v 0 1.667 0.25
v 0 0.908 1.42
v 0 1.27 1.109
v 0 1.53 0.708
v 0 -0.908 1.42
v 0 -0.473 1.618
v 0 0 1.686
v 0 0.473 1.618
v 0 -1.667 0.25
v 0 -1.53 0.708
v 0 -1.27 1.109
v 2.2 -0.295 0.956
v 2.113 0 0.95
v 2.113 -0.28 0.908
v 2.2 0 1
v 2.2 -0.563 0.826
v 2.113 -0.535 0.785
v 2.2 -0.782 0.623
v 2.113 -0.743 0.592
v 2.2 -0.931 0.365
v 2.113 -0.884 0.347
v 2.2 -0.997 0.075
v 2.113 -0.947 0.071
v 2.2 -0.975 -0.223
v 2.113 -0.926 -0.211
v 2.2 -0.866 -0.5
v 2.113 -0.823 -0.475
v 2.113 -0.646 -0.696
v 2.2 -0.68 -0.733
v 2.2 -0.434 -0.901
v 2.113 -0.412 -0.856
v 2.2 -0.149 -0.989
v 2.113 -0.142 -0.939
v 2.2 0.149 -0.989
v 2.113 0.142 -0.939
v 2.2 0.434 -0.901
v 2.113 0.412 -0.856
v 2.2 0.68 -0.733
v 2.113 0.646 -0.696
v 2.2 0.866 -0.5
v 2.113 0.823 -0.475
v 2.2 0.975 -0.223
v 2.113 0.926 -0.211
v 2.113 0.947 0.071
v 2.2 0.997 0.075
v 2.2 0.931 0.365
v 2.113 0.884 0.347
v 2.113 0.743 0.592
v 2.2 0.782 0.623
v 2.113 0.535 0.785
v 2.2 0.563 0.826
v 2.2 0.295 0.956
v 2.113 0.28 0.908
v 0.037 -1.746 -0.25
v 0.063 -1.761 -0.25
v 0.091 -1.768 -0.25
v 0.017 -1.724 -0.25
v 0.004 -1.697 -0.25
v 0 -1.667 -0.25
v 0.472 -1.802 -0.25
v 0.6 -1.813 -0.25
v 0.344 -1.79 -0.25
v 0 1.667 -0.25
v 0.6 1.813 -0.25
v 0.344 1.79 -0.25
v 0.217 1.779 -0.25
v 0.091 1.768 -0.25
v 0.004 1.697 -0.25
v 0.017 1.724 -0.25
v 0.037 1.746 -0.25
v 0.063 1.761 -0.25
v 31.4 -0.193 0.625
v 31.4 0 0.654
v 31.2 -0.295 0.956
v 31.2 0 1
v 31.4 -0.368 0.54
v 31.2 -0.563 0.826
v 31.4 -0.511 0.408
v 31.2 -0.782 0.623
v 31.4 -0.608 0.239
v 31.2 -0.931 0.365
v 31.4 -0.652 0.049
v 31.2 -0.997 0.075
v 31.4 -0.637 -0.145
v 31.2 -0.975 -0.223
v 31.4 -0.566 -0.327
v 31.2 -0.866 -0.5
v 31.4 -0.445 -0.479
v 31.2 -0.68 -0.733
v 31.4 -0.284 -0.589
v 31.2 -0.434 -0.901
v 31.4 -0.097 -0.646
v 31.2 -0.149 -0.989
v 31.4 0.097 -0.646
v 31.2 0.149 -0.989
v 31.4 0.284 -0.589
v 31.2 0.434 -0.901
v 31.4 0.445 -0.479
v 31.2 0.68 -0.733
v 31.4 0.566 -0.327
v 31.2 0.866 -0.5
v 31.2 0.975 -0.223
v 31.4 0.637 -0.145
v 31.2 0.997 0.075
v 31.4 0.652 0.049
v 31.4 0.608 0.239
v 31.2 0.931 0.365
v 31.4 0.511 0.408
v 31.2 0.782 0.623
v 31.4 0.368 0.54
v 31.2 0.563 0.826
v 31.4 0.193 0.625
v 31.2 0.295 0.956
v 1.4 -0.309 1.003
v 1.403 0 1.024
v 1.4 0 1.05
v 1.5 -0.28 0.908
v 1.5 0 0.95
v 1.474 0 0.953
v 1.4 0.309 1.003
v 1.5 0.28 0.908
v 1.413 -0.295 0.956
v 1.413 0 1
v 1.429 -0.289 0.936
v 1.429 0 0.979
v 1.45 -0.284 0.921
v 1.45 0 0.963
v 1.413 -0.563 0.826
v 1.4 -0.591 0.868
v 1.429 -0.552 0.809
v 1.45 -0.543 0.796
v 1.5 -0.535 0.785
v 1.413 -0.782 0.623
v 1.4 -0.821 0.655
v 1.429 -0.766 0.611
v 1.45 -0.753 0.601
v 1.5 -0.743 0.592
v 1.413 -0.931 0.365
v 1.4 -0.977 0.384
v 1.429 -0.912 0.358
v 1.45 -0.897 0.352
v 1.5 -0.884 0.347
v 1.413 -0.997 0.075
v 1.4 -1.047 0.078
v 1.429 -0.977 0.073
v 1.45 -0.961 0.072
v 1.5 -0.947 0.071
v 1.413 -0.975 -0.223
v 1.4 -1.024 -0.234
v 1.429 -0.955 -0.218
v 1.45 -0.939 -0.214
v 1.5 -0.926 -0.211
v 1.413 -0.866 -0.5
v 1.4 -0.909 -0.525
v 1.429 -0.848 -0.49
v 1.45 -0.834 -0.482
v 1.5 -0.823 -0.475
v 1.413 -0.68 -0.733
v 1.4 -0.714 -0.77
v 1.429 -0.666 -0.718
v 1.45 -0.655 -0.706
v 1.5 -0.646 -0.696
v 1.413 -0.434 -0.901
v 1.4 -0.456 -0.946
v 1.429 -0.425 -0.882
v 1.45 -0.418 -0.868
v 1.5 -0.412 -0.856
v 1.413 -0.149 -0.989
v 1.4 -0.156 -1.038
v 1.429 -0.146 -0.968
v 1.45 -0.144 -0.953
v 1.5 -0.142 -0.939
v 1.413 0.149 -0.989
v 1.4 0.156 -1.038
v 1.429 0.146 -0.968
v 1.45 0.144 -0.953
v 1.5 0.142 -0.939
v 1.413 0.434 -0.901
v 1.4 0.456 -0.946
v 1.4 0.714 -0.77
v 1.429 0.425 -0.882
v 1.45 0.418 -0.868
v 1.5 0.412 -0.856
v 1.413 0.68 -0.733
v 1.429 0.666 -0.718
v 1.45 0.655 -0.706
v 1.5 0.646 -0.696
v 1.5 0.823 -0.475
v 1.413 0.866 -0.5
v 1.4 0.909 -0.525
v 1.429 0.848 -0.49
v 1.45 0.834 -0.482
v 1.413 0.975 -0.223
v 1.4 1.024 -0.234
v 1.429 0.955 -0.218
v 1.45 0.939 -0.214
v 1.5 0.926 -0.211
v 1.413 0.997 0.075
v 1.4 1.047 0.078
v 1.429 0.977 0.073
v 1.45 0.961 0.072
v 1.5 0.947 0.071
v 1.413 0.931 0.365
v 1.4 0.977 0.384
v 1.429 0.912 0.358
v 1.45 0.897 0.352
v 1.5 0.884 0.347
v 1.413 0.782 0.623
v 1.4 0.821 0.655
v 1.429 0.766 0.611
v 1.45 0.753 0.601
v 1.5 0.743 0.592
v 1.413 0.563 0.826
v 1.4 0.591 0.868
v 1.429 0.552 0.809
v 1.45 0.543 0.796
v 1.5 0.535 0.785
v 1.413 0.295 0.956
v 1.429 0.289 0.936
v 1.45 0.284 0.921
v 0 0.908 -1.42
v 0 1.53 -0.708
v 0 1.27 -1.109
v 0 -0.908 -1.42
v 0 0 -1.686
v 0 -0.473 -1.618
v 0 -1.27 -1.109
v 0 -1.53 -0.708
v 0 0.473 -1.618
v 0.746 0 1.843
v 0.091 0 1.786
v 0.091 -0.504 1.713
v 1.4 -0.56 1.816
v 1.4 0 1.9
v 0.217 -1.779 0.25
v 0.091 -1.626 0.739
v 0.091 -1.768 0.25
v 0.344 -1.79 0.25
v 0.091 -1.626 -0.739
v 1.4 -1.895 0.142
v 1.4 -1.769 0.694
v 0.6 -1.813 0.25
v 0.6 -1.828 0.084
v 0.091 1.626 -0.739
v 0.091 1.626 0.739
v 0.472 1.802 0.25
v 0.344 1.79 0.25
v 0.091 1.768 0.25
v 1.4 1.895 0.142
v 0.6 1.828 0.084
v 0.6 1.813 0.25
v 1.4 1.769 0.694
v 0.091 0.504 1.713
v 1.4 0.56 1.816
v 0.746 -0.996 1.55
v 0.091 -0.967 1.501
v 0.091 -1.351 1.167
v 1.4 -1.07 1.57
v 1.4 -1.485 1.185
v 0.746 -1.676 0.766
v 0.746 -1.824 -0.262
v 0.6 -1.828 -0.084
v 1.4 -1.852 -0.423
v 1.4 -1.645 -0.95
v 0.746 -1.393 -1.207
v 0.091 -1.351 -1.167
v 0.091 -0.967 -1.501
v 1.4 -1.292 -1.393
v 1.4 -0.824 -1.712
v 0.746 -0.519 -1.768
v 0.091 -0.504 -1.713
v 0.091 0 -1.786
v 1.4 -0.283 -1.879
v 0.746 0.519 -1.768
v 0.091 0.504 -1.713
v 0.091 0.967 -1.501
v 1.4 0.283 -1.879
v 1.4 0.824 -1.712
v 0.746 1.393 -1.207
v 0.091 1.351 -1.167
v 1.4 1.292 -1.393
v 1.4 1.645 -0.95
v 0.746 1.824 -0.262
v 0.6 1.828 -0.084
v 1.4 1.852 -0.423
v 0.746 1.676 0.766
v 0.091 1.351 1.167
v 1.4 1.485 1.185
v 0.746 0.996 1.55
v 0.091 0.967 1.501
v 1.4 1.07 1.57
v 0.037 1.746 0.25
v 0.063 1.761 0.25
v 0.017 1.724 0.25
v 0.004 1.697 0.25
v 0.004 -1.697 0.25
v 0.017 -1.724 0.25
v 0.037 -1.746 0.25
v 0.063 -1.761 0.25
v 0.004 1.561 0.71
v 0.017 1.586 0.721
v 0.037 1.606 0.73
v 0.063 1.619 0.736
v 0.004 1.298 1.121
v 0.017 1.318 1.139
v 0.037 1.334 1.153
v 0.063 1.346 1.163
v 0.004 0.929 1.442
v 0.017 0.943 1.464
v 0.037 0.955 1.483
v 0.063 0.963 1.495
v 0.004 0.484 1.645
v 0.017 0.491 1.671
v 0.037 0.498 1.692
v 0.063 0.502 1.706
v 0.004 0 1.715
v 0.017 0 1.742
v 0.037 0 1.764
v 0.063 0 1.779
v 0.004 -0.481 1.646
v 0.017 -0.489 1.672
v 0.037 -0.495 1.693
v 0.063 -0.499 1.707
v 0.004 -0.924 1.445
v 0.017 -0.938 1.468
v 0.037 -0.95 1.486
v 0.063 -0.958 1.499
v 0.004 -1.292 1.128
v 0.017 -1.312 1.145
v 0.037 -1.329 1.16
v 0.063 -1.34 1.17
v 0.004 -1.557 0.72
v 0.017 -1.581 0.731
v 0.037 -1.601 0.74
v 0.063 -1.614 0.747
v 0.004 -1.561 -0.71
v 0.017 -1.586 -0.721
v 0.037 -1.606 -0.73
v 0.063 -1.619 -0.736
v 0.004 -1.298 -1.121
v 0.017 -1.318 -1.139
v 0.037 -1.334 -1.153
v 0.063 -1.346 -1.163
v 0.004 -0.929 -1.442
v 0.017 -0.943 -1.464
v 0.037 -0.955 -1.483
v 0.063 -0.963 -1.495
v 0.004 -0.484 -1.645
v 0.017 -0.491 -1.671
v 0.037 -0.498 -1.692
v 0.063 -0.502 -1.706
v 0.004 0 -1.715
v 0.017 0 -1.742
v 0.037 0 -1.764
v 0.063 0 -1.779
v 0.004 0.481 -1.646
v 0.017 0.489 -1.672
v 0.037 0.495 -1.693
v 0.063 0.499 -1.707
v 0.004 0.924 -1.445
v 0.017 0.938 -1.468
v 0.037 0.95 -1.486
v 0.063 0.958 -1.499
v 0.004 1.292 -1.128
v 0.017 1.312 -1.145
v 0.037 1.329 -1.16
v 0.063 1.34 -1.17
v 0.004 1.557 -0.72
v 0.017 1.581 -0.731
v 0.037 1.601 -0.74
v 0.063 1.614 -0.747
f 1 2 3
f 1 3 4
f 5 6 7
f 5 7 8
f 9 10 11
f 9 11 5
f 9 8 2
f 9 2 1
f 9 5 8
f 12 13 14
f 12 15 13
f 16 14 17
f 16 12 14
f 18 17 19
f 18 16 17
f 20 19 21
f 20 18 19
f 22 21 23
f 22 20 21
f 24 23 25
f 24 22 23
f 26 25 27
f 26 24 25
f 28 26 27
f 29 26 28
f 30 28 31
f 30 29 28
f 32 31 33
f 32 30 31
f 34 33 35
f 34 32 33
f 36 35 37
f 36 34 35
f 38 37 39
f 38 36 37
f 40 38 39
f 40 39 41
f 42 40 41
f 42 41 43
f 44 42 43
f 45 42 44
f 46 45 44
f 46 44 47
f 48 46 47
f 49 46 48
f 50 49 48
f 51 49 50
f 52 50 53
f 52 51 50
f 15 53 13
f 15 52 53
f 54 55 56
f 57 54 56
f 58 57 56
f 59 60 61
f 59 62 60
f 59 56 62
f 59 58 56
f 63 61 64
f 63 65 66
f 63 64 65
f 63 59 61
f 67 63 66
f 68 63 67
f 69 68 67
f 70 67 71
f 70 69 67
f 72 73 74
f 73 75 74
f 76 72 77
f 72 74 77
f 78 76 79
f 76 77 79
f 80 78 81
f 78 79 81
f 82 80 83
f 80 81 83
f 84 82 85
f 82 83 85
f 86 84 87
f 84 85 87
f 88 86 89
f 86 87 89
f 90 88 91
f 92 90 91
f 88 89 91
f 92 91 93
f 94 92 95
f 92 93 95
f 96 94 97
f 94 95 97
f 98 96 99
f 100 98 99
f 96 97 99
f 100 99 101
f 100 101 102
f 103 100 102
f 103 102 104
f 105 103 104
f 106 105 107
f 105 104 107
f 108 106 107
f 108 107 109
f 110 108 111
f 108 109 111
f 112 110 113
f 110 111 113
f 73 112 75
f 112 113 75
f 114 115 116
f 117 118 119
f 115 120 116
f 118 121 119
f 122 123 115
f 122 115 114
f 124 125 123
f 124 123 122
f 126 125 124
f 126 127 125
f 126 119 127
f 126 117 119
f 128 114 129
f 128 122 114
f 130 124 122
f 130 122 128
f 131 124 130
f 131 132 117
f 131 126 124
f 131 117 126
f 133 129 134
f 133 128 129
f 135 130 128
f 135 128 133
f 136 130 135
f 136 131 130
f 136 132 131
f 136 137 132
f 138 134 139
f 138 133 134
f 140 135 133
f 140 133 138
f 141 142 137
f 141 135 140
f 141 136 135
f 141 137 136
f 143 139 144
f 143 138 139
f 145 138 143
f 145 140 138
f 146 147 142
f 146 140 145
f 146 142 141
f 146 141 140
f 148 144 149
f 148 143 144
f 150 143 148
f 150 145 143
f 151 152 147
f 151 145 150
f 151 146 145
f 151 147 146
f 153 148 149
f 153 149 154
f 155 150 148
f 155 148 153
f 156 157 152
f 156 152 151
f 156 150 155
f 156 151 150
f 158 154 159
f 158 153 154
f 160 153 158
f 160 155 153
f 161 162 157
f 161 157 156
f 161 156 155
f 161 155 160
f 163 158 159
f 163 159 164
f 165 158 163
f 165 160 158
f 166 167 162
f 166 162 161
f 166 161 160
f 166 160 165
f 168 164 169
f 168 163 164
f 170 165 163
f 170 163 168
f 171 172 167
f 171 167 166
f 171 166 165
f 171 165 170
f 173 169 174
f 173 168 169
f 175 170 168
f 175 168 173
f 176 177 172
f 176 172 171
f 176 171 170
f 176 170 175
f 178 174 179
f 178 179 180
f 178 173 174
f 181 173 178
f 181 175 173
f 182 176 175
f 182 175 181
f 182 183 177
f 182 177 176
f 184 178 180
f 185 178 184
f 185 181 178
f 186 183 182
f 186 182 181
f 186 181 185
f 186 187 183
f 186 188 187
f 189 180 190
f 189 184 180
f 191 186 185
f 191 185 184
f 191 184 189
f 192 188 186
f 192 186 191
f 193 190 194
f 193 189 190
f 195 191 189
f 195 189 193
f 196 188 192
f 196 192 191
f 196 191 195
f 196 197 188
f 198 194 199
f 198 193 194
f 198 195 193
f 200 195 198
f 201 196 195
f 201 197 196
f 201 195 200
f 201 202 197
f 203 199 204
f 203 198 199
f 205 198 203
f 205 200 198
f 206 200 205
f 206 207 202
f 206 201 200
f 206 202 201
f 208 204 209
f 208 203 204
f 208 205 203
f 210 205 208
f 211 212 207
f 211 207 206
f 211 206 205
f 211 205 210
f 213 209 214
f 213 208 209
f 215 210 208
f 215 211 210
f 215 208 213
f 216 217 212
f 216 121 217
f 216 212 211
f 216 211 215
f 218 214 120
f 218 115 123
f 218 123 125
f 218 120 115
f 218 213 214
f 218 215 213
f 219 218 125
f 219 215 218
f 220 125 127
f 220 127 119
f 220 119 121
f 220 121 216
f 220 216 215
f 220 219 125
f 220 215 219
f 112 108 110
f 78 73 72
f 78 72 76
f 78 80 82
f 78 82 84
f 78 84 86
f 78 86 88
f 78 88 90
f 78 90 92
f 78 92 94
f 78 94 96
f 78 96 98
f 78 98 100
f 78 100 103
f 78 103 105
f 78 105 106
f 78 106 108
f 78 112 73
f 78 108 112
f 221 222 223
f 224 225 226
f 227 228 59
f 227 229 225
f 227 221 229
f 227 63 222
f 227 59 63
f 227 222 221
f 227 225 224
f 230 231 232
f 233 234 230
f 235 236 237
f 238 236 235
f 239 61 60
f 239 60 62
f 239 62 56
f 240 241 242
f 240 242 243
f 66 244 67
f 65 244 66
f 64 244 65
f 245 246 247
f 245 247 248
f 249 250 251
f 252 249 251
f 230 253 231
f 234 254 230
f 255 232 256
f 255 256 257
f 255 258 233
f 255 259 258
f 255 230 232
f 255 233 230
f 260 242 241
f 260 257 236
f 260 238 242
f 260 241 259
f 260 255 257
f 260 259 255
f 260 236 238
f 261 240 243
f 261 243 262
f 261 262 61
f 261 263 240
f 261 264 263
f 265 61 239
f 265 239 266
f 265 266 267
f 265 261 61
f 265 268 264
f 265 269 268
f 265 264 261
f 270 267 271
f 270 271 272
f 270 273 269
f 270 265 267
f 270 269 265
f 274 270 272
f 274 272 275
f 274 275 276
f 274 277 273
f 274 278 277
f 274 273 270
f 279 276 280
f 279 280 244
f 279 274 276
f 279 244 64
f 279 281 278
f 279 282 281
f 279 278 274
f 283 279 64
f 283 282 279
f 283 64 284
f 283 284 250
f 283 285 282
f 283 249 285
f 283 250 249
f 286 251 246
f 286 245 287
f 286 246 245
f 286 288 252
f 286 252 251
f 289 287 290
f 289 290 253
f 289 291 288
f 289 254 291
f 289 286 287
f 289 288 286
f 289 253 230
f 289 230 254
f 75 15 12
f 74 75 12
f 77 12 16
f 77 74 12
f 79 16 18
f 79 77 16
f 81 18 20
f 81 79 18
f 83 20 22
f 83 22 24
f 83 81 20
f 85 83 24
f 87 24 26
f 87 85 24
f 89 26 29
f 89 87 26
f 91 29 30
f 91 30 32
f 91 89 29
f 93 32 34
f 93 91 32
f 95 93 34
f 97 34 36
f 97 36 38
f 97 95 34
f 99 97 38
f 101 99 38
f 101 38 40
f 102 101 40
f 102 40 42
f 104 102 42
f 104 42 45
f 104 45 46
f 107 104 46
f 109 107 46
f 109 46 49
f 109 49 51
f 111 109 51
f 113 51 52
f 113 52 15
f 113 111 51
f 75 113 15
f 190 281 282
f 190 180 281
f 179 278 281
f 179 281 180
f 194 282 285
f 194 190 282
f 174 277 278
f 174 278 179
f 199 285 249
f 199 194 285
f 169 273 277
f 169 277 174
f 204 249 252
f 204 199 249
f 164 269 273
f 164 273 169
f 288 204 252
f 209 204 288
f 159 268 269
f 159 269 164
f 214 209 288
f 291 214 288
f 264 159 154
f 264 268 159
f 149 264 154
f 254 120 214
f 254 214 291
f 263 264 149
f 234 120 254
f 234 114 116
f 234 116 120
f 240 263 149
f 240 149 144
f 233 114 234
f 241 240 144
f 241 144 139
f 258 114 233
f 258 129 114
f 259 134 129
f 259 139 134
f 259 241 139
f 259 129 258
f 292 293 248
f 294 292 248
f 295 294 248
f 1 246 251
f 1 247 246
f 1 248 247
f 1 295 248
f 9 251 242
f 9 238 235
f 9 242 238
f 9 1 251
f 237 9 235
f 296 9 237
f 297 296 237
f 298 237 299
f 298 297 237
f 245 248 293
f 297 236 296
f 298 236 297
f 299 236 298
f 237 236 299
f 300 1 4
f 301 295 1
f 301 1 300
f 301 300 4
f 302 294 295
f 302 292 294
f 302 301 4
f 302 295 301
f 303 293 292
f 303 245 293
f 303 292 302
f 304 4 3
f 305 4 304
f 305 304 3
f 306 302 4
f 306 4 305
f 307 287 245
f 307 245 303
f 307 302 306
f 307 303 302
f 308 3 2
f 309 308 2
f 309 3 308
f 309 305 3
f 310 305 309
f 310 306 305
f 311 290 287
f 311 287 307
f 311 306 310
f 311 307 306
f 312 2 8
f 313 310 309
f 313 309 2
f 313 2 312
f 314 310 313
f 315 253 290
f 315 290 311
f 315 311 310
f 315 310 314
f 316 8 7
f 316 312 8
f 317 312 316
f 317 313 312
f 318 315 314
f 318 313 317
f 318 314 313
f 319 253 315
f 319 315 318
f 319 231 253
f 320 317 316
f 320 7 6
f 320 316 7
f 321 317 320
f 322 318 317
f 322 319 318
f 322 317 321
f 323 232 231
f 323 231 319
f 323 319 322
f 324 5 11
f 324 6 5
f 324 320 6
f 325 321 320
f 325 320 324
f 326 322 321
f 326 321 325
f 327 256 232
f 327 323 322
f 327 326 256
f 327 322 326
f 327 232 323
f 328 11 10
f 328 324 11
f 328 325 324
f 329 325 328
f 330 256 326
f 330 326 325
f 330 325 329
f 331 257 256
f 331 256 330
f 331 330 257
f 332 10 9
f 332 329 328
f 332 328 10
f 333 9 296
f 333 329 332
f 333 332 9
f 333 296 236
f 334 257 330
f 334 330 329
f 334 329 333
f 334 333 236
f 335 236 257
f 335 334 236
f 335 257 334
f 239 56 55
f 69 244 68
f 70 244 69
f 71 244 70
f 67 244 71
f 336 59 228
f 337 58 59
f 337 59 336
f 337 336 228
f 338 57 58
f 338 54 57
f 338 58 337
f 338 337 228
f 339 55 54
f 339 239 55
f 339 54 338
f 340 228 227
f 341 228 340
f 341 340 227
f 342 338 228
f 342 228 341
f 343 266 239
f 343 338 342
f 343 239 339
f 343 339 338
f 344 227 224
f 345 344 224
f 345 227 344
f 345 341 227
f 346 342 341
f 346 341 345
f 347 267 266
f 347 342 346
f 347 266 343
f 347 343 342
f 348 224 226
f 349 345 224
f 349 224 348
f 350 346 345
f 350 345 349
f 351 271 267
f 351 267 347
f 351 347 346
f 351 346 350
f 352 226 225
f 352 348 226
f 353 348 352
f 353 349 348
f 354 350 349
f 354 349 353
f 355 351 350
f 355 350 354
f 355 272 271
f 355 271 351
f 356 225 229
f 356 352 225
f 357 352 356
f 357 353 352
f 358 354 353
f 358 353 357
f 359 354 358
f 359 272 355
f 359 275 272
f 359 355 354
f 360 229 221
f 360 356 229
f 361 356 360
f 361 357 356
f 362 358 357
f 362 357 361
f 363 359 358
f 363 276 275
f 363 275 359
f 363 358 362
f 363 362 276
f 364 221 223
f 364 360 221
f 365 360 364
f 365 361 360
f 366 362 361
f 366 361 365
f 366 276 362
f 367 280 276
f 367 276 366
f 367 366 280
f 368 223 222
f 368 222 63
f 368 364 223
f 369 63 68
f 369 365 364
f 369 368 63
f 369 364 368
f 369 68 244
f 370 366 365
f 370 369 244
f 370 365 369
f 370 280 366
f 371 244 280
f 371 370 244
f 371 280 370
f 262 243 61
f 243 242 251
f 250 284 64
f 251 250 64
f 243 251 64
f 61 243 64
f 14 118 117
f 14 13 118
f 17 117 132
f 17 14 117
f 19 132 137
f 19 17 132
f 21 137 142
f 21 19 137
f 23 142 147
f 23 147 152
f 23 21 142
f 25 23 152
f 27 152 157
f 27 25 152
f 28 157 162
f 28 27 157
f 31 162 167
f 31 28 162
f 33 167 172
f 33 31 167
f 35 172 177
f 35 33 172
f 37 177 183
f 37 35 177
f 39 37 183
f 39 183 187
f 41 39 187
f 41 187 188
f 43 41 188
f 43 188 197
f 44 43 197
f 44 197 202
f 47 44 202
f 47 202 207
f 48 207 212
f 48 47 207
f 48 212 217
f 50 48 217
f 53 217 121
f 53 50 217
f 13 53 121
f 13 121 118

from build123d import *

# Parameters (mm, degrees)
CUT_EXTRUDE_1_DEPTH = 0.6


with BuildPart() as part:
    # 草图1 → Revolve 651 (revolve)
    with BuildSketch(Plane.XY, mode=Mode.PRIVATE) as revolve_651_sk:
        with BuildLine():
            Line((0, 0), (0, 1.685882754))
            ThreePointArc((0, 1.685882754), (0.026272266, 1.753441774), (0.091284426, 1.785502223))
            Line((0.091284426, 1.785502223), (1.4, 1.9))
            Line((1.4, 1.9), (1.4, 1.05))
            ThreePointArc((1.4, 1.05), (1.429289322, 0.979289322), (1.5, 0.95))
            Line((1.5, 0.95), (2.11339746, 0.95))
            Line((2.11339746, 0.95), (2.2, 1))
            Line((2.2, 1), (31.4, 1))
            Line((31.4, 1), (31.4, 0))
            Line((31.4, 0), (0, 0))
        make_face()
    revolve(revolve_651_sk.sketch.rotate(Axis((0, 0, 0), (1, 0, 0)), 90), axis=Axis((0, 0, 0), (1, 0, 0)))

    # 草图2 → 切除-拉伸1 (cut)
    with BuildSketch(Plane.ZY):
        with BuildLine():
            Line((0.25, 1.88348082), (0.25, -1.88348082))
            ThreePointArc((0.25, -1.88348082), (0, -1.9), (-0.25, -1.88348082))
            Line((-0.25, -1.88348082), (-0.25, 1.88348082))
            ThreePointArc((-0.25, 1.88348082), (0, 1.9), (0.25, 1.88348082))
        make_face()
    extrude(amount=-CUT_EXTRUDE_1_DEPTH, mode=Mode.SUBTRACT)

    # 草图3 → 切除-旋转1 (revolve, cut)
    with BuildSketch(Plane(origin=(0, 0, 0), x_dir=(1, 0, 0), z_dir=(0, 1, 0)), mode=Mode.PRIVATE) as cut_revolve_1_sk:
        Polygon((31.200005867, 1), (31.599994133, 1), (31.4, 0.6536), align=None)
    revolve(cut_revolve_1_sk.sketch.rotate(Axis((0, 0, 0), (1, 0, 0)), 180), axis=Axis((0, 0, 0), (1, 0, 0)), mode=Mode.SUBTRACT)


solid = part.part
